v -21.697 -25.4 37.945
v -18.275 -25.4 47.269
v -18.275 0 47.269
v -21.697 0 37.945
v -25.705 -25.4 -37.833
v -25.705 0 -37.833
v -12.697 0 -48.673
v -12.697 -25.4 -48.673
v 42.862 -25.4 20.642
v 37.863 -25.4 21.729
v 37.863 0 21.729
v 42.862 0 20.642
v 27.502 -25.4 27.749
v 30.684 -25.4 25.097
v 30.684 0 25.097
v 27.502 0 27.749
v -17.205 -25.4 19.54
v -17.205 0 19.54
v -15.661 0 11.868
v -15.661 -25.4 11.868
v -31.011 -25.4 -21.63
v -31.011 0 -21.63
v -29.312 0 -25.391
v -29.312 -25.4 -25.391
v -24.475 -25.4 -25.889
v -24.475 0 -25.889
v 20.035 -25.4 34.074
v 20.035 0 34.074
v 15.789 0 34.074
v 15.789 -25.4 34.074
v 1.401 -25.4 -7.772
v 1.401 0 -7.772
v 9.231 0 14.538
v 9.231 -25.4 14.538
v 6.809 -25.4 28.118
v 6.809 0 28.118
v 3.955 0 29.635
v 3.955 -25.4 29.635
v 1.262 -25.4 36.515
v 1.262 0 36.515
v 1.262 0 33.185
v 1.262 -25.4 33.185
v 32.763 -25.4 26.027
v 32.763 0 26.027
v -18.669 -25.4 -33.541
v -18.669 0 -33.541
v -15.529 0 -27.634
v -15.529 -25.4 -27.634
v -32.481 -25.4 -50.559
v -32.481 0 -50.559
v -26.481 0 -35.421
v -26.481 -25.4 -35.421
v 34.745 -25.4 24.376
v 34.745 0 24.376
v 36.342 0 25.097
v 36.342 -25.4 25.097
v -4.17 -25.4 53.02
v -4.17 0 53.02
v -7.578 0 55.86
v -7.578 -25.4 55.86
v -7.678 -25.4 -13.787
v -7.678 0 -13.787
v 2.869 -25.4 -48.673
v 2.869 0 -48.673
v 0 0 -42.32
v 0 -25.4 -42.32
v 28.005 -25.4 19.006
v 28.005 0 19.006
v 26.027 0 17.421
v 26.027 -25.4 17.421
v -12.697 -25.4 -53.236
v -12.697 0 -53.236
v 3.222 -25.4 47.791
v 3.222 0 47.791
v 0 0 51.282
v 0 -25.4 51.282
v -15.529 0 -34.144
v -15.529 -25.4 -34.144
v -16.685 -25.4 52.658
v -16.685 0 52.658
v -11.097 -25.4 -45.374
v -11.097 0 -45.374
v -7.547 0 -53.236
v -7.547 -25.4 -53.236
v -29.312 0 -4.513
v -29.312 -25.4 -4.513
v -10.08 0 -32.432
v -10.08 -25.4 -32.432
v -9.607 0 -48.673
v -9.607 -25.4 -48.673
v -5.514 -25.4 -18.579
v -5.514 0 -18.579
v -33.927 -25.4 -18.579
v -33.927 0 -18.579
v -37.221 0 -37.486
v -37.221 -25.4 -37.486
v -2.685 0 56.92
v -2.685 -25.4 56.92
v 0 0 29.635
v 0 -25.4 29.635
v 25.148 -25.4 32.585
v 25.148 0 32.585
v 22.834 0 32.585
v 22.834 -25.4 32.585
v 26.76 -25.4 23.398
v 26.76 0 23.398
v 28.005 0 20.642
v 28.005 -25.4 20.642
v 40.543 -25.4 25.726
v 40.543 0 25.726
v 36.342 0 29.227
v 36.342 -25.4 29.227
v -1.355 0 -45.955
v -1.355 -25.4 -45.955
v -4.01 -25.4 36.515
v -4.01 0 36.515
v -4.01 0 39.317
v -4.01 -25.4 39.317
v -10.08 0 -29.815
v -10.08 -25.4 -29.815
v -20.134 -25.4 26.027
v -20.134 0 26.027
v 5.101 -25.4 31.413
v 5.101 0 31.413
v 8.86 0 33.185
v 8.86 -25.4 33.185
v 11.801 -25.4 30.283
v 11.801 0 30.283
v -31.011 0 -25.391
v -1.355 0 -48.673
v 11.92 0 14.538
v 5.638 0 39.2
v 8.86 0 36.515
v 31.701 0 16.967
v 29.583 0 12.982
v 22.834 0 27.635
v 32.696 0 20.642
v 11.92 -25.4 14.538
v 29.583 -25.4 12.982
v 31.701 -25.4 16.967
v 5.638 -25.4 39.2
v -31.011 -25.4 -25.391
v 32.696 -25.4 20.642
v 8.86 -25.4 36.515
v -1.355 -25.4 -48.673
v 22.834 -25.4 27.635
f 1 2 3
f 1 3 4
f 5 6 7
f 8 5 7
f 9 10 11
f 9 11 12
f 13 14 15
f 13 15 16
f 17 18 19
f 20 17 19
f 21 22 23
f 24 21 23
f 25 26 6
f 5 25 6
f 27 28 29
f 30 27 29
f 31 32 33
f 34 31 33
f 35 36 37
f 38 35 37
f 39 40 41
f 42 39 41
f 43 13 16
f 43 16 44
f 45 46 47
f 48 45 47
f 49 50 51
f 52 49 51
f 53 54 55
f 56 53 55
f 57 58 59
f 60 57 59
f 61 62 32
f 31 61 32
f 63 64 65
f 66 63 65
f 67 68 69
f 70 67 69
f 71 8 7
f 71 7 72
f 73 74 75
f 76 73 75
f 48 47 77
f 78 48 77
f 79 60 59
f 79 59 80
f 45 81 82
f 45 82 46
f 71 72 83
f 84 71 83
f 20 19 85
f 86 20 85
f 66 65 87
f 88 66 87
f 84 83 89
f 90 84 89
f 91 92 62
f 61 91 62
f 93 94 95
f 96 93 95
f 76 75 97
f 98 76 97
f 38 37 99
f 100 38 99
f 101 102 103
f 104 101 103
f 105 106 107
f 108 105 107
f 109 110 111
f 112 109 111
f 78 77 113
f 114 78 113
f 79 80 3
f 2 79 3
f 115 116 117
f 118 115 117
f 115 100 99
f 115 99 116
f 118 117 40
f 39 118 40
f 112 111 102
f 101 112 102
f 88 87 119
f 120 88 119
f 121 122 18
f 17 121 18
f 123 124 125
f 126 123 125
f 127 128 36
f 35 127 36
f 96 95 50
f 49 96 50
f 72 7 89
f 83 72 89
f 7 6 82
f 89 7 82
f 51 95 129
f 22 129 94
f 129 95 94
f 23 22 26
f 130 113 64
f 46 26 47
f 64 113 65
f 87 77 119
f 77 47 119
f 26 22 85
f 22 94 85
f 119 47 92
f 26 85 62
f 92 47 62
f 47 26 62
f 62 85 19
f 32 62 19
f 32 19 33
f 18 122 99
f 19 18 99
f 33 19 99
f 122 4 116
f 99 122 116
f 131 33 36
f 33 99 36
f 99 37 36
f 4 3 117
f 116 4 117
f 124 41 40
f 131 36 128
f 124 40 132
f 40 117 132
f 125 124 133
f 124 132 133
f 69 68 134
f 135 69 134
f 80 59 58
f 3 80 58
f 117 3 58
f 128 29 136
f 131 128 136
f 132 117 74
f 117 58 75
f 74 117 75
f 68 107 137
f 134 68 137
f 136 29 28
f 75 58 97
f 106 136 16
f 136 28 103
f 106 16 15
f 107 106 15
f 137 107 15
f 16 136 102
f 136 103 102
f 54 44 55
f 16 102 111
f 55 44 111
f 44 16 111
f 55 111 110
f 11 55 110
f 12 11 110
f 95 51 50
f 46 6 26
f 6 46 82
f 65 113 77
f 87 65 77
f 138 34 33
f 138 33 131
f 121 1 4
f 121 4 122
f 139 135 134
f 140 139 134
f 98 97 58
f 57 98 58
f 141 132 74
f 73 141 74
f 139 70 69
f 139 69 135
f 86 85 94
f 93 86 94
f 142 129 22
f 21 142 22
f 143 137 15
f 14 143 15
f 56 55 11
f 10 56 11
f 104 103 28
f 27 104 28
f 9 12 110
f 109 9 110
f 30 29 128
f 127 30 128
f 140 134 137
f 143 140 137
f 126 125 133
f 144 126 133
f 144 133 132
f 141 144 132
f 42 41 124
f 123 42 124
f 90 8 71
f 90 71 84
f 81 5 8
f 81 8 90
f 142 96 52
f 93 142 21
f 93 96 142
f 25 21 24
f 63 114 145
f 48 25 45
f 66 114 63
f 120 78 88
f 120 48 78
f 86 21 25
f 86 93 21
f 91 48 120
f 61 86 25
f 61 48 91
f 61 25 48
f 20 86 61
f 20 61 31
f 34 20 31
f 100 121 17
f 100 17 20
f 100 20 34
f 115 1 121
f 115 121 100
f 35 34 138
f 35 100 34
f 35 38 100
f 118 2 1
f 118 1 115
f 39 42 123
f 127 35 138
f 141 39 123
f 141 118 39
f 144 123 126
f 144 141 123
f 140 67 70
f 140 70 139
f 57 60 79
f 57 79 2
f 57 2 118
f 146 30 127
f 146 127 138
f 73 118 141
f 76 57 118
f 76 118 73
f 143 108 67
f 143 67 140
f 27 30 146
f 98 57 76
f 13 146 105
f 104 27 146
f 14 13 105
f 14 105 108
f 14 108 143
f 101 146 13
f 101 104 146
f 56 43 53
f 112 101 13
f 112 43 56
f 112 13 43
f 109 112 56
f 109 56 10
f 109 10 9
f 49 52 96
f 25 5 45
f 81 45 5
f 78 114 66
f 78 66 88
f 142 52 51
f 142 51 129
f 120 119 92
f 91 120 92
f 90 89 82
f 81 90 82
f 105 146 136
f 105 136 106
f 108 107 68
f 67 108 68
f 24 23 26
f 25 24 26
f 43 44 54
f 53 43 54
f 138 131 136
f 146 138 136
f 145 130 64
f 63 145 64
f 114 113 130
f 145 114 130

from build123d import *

# Parameters (mm, degrees)
F1_DEPTH = 25.4


# Not quite as in the source:
# - ends of sketch curves that miss each other by under 0.0002 mm in the source are joined


with BuildPart() as f1:
    # F0 (on Front) → F1 (new body)
    with BuildSketch(Plane.XZ):
        Polygon((0, 51.2815788388), (-2.6849012356, 56.9198653102), (-4.1696302487, 53.0196329049), (-7.5777377933, 55.8597221971), (-16.6846867651, 52.6580624282), (-18.2750094682, 47.2689494491), (-21.6973181814, 37.9454642534), (-20.1343216481, 26.0272607351), (-17.2047130764, 19.5402652025), (-15.6613234345, 11.8683064511), (-29.3124747088, -4.5130769722), (-33.9270979166, -18.5791757945), (-37.2212677423, -37.4857979189), (-32.480597056, -50.5585558089), (-26.4811083451, -35.4206826298), (-31.0107059295, -25.3908514852), (-31.0107059295, -21.6304793835), (-29.3124747088, -25.3908514852), (-24.4753230363, -25.888632983), (-25.7045285945, -37.8333391404), (-12.6969534904, -48.6729838072), (-12.6969534904, -53.2361328939), (-7.5467102784, -53.2361328939), (-9.6074856576, -48.6729838072), (-11.097422801, -45.3738346696), (-18.6685893591, -33.5405004938), (-15.5289131012, -27.6335775852), (-15.5289131012, -34.1437415194), (-1.3548218412, -45.9554828703), (-1.3548218412, -48.6729838072), (2.8690039134, -48.6729838072), (0, -42.3201844096), (-10.079539381, -32.4321724474), (-10.079539381, -29.8147555441), (-5.5140842237, -18.5791757945), (-7.6782507822, -13.7870889157), (1.4005823759, -7.7723623253), (9.2310756445, 14.5376751978), (11.9198445967, 14.5376751978), (22.8343526097, 27.6350863278), (26.7602472754, 23.3975637498), (28.004777182, 20.64181678), (28.004777182, 19.005872948), (26.0269176215, 17.4214001745), (29.5830273071, 12.9823932965), (31.7011885345, 16.9674586505), (32.6957959123, 20.64181678), (30.6835759384, 25.0974502414), (27.5022275746, 27.7485735714), (32.7634411399, 26.0272607351), (34.7447489485, 24.3761710855), (36.341868341, 25.0974502414), (37.8633029759, 21.7285566032), (42.8623110056, 20.64181678), (40.5427415461, 25.7263357936), (36.341868341, 29.2270630598), (25.148447603, 32.5854149557), (22.8343526097, 32.5854149557), (20.0345981866, 34.0735539794), (15.7886892557, 34.0735539794), (11.8005704135, 30.2826426923), (6.8094845357, 28.1176646778), (3.9549916983, 29.6348985285), (0, 29.6348985285), (-4.0098810568, 36.5146324039), (-4.0098810568, 39.3167249858), (1.2619188055, 36.5146324039), (1.2619188055, 33.1852734089), (5.1013175398, 31.4132459462), (8.8601689786, 33.1852734089), (8.8601689786, 36.5146324039), (5.6382901967, 39.1995310783), (3.2218813431, 47.7912090719), align=None)
    extrude(amount=F1_DEPTH)


solid = f1.part
